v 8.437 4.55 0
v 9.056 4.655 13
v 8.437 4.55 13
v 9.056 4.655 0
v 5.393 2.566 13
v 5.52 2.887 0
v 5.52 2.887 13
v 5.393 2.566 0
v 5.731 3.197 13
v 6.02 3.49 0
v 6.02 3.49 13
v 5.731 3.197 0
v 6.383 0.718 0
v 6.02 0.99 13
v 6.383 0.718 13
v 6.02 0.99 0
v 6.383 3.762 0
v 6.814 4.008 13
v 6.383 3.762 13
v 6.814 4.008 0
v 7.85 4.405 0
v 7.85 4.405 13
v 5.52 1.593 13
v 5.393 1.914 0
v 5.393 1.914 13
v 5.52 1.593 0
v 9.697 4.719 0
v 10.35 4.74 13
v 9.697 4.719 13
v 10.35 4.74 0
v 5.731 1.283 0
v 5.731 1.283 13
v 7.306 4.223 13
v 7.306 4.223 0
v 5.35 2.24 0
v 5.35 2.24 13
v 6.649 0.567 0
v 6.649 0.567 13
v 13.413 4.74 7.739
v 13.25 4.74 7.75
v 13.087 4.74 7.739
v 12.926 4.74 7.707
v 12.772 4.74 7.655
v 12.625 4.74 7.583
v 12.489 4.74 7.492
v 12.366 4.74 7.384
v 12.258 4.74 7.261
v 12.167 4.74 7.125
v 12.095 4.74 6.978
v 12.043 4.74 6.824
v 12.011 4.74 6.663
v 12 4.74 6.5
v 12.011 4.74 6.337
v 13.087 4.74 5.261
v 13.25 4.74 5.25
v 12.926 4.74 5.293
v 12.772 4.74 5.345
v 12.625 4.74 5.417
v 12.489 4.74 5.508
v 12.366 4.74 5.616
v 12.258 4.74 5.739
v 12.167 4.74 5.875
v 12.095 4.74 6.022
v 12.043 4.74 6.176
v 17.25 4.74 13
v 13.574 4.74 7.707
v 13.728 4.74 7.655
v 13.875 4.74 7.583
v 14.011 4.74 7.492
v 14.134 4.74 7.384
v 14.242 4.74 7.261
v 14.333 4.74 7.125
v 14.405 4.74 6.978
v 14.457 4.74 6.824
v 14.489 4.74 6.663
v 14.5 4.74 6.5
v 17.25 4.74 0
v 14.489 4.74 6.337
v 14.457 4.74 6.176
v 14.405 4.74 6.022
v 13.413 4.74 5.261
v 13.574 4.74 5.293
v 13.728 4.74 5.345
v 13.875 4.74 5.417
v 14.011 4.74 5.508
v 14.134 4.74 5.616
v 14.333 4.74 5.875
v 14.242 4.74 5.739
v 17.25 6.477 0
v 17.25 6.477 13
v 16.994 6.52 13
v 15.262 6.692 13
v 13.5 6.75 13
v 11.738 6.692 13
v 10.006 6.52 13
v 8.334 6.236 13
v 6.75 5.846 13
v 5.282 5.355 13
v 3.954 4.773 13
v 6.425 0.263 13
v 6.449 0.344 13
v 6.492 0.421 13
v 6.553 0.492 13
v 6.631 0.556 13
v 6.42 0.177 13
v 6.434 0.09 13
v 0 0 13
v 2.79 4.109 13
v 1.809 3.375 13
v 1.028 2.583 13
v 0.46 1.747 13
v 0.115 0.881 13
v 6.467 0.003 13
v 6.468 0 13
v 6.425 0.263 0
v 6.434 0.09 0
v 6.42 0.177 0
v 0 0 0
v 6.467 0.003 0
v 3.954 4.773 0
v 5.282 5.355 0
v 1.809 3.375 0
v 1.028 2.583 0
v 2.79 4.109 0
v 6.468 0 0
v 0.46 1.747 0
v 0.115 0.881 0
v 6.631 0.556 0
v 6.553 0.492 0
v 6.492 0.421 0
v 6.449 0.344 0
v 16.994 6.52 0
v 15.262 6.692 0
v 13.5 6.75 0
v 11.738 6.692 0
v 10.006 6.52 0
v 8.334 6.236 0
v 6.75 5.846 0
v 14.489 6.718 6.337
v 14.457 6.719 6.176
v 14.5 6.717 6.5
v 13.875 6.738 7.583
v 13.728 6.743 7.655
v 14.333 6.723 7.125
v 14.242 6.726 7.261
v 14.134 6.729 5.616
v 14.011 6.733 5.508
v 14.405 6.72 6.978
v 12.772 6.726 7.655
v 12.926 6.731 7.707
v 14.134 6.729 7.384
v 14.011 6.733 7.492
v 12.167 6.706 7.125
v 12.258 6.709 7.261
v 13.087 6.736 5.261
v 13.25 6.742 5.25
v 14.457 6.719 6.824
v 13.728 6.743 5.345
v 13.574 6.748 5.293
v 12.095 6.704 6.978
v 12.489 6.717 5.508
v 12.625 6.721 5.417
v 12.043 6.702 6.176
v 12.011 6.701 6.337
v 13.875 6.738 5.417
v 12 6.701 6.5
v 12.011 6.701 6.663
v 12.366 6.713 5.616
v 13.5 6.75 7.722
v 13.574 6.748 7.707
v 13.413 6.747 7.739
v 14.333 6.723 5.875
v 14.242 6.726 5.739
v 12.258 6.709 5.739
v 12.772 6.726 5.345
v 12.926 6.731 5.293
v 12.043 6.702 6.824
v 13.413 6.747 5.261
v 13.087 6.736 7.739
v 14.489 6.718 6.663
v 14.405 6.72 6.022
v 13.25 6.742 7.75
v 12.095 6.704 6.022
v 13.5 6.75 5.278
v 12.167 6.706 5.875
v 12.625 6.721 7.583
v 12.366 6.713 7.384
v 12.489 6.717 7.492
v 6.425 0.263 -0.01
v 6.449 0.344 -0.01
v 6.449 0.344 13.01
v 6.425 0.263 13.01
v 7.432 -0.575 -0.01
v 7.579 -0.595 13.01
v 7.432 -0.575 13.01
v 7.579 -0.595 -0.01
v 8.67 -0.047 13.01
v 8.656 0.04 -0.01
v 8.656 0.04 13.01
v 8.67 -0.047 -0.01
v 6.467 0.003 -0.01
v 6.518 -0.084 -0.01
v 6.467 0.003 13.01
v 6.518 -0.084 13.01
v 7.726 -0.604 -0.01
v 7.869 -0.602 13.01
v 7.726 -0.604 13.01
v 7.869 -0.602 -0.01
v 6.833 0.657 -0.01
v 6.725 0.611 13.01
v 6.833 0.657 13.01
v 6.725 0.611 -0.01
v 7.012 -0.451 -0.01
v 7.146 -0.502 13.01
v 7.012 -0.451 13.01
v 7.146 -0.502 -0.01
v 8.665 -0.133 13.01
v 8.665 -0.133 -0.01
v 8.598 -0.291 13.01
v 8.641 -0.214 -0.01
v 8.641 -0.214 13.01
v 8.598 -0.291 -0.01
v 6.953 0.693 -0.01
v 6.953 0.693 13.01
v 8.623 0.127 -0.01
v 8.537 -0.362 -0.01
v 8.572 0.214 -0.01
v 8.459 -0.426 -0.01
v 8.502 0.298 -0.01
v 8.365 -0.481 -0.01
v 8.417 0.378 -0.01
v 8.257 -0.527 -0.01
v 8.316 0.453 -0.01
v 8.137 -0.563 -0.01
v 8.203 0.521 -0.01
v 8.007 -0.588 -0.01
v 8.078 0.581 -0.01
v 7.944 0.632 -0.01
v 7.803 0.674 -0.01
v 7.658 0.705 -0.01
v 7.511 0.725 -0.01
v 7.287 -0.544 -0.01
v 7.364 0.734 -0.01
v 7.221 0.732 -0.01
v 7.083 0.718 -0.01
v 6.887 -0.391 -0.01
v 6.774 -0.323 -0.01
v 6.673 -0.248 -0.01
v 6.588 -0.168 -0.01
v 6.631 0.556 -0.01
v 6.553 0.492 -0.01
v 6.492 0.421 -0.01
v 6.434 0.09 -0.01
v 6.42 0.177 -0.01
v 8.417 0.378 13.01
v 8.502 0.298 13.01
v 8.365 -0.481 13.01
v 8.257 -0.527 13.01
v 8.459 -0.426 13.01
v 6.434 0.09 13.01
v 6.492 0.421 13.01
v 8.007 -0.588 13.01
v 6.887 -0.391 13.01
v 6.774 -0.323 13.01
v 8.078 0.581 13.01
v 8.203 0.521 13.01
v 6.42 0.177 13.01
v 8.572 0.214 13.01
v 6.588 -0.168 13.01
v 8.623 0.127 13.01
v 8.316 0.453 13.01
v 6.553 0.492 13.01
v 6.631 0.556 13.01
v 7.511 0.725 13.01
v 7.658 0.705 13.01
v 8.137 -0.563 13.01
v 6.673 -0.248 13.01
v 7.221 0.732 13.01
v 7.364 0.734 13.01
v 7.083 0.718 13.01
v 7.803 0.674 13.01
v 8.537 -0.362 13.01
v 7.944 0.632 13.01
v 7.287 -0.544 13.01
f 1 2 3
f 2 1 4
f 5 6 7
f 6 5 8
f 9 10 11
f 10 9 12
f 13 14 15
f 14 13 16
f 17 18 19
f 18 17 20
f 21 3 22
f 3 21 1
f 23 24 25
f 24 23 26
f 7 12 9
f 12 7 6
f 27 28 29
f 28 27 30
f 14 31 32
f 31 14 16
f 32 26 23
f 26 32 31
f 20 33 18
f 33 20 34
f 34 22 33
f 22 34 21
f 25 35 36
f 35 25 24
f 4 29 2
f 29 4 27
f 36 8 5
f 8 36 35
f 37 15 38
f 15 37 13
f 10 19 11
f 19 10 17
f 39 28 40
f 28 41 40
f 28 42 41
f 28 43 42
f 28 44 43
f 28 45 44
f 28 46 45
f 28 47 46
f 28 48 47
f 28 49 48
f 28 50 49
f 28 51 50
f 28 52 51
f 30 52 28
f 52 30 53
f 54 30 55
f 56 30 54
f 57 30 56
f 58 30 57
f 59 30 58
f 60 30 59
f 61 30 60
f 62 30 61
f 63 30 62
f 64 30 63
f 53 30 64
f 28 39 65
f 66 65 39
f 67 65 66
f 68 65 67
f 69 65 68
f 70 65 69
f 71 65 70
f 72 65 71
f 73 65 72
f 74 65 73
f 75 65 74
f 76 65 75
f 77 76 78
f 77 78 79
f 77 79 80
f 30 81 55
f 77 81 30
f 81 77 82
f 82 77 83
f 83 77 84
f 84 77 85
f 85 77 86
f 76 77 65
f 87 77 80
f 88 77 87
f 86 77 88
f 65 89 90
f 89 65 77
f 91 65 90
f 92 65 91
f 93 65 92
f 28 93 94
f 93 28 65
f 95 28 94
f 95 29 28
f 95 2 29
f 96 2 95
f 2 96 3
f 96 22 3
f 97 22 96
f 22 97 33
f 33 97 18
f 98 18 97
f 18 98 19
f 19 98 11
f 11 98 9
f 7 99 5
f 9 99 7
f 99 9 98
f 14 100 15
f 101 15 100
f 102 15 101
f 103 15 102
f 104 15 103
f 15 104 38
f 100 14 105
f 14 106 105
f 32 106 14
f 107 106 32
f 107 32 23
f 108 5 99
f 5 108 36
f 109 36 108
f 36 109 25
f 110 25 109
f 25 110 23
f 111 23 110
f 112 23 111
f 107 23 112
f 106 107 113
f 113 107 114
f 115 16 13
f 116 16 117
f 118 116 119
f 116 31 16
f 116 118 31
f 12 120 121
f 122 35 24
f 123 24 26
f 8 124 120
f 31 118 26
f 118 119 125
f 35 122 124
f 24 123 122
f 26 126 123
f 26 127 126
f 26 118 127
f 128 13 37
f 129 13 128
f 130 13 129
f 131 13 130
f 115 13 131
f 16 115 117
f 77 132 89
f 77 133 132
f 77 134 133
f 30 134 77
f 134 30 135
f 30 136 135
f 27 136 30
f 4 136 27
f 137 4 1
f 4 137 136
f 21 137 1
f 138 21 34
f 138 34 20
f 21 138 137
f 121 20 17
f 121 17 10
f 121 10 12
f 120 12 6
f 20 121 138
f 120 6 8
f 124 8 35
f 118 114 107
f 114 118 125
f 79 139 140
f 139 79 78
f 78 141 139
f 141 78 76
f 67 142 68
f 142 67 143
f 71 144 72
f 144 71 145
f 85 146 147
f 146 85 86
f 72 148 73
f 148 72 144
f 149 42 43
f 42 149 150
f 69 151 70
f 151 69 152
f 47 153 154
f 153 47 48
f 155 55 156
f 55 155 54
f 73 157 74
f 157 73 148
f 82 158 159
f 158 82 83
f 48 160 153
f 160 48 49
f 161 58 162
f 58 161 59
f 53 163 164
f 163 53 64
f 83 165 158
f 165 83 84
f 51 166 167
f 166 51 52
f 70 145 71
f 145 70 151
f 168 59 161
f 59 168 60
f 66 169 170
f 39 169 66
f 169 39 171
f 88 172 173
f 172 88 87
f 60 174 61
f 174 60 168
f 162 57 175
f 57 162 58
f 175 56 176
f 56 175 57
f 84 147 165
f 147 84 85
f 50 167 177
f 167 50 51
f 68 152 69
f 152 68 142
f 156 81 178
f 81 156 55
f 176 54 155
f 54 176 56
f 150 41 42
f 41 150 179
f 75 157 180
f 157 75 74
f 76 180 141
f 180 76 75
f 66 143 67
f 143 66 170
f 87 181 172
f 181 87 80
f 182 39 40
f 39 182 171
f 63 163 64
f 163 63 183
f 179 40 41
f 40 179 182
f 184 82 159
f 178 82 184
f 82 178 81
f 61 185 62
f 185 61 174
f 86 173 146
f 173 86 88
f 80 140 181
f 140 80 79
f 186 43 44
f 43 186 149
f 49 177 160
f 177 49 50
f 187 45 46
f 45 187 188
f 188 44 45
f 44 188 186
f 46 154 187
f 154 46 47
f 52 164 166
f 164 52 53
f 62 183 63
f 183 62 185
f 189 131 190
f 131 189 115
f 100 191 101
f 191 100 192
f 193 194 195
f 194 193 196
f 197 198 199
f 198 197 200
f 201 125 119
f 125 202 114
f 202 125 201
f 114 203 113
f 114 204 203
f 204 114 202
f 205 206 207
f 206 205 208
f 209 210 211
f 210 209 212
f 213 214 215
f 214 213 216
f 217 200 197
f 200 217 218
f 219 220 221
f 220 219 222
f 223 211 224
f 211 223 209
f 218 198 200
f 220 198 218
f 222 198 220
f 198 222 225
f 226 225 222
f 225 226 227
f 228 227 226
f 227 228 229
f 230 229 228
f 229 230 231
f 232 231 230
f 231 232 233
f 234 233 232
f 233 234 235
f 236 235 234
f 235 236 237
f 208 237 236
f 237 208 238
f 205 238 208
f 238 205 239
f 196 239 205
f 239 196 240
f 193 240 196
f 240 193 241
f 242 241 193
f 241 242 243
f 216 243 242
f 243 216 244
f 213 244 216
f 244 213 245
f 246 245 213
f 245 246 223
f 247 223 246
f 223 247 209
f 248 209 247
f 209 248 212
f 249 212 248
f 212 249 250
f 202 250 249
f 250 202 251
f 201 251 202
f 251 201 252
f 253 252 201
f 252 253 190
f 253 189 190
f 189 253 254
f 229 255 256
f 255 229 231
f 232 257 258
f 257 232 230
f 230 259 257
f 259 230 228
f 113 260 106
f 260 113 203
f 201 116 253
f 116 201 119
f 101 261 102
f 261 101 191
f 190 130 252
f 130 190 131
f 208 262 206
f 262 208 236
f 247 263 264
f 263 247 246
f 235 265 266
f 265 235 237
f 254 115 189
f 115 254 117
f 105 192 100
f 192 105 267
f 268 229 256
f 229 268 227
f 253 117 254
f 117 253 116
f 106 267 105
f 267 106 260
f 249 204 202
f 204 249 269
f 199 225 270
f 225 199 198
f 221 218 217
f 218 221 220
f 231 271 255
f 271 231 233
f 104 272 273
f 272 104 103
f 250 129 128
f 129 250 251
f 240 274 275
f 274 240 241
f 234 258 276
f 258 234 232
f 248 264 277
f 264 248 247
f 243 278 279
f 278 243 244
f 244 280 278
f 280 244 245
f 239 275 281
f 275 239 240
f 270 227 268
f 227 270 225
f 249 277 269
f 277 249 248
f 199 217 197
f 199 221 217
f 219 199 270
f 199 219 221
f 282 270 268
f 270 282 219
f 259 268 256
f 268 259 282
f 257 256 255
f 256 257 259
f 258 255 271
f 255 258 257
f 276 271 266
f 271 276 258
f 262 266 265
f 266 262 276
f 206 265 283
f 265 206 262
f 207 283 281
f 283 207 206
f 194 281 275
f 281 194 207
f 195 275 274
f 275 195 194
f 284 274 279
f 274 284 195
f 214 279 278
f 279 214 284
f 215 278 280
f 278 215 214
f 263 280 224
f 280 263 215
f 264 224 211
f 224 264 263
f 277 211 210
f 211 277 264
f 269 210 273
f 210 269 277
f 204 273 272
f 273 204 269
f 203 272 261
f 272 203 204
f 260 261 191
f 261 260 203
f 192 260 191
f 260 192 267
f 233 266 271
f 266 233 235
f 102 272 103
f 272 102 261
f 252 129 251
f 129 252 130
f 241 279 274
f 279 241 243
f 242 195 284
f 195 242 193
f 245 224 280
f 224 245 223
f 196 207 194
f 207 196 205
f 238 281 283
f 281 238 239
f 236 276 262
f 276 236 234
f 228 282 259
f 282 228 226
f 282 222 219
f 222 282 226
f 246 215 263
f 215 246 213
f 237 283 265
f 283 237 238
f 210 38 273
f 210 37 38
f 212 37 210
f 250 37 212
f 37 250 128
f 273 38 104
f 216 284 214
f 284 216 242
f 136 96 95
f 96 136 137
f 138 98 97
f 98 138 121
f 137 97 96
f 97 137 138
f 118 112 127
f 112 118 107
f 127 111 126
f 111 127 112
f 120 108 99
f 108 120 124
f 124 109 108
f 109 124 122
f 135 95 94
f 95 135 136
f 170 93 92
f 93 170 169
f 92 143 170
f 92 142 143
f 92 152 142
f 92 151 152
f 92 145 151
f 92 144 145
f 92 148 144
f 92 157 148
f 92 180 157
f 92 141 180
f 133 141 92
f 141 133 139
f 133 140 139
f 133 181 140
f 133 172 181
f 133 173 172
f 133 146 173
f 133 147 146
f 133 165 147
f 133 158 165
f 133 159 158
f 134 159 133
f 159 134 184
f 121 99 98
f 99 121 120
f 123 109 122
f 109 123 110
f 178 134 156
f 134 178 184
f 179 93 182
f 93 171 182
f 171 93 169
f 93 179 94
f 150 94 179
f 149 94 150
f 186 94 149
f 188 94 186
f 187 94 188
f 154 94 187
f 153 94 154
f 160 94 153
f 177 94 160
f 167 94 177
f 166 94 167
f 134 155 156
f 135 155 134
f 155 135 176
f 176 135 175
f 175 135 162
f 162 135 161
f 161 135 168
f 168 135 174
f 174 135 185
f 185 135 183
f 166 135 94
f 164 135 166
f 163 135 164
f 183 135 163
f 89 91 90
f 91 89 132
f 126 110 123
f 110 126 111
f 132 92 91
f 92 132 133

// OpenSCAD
body_length = 17.25;
body_width = 6.75;
height = 13;

cavity_diameter = 5;
cavity_elongation = 2.0;

hole_diameter = 2.5;
hole_offset = 4;

lip_diameter = 1.3;

epsilon = 0.01;

$fn=48;

module body () {
  cube([body_length, body_width, height]);
}

module cavity() {
  translate([body_length*0.6,cavity_diameter*0.45,0]){
    scale([cavity_elongation,1,1]) {
      translate([0,-epsilon,-epsilon]) {
        union() {
          cylinder(h=height+2*epsilon, d=cavity_diameter);
          translate([0,-cavity_diameter/2,0]) {
            cube([body_length,cavity_diameter,height+2*epsilon]);
          }
        }
      }
    }
  }
}

module lip() {
  translate([body_length*0.62-lip_diameter*0.5-cavity_diameter*0.5,
             lip_diameter*0.05,
             -epsilon]) {
    rotate(a=-10, v=[0,0,1]) {
      scale([1.75,1,1]) {
        cylinder(h=height+2*epsilon,d=lip_diameter);
      }
    }
  }
}

module hole() {
  translate([body_length-hole_offset,0,height/2]) {
    rotate(a=-90,v=[1,0,0]) {
      cylinder(h=body_width*2,d=hole_diameter);
    }
  }
}

intersection() {
  scale([2,1,1]) {
    translate([body_width,0,-epsilon]) {
      cylinder(r=body_width, h=height+2*epsilon);
    }
  }
  union() {
    difference() {
      body();
      cavity();
      hole();
    }
    lip();
  }
}
